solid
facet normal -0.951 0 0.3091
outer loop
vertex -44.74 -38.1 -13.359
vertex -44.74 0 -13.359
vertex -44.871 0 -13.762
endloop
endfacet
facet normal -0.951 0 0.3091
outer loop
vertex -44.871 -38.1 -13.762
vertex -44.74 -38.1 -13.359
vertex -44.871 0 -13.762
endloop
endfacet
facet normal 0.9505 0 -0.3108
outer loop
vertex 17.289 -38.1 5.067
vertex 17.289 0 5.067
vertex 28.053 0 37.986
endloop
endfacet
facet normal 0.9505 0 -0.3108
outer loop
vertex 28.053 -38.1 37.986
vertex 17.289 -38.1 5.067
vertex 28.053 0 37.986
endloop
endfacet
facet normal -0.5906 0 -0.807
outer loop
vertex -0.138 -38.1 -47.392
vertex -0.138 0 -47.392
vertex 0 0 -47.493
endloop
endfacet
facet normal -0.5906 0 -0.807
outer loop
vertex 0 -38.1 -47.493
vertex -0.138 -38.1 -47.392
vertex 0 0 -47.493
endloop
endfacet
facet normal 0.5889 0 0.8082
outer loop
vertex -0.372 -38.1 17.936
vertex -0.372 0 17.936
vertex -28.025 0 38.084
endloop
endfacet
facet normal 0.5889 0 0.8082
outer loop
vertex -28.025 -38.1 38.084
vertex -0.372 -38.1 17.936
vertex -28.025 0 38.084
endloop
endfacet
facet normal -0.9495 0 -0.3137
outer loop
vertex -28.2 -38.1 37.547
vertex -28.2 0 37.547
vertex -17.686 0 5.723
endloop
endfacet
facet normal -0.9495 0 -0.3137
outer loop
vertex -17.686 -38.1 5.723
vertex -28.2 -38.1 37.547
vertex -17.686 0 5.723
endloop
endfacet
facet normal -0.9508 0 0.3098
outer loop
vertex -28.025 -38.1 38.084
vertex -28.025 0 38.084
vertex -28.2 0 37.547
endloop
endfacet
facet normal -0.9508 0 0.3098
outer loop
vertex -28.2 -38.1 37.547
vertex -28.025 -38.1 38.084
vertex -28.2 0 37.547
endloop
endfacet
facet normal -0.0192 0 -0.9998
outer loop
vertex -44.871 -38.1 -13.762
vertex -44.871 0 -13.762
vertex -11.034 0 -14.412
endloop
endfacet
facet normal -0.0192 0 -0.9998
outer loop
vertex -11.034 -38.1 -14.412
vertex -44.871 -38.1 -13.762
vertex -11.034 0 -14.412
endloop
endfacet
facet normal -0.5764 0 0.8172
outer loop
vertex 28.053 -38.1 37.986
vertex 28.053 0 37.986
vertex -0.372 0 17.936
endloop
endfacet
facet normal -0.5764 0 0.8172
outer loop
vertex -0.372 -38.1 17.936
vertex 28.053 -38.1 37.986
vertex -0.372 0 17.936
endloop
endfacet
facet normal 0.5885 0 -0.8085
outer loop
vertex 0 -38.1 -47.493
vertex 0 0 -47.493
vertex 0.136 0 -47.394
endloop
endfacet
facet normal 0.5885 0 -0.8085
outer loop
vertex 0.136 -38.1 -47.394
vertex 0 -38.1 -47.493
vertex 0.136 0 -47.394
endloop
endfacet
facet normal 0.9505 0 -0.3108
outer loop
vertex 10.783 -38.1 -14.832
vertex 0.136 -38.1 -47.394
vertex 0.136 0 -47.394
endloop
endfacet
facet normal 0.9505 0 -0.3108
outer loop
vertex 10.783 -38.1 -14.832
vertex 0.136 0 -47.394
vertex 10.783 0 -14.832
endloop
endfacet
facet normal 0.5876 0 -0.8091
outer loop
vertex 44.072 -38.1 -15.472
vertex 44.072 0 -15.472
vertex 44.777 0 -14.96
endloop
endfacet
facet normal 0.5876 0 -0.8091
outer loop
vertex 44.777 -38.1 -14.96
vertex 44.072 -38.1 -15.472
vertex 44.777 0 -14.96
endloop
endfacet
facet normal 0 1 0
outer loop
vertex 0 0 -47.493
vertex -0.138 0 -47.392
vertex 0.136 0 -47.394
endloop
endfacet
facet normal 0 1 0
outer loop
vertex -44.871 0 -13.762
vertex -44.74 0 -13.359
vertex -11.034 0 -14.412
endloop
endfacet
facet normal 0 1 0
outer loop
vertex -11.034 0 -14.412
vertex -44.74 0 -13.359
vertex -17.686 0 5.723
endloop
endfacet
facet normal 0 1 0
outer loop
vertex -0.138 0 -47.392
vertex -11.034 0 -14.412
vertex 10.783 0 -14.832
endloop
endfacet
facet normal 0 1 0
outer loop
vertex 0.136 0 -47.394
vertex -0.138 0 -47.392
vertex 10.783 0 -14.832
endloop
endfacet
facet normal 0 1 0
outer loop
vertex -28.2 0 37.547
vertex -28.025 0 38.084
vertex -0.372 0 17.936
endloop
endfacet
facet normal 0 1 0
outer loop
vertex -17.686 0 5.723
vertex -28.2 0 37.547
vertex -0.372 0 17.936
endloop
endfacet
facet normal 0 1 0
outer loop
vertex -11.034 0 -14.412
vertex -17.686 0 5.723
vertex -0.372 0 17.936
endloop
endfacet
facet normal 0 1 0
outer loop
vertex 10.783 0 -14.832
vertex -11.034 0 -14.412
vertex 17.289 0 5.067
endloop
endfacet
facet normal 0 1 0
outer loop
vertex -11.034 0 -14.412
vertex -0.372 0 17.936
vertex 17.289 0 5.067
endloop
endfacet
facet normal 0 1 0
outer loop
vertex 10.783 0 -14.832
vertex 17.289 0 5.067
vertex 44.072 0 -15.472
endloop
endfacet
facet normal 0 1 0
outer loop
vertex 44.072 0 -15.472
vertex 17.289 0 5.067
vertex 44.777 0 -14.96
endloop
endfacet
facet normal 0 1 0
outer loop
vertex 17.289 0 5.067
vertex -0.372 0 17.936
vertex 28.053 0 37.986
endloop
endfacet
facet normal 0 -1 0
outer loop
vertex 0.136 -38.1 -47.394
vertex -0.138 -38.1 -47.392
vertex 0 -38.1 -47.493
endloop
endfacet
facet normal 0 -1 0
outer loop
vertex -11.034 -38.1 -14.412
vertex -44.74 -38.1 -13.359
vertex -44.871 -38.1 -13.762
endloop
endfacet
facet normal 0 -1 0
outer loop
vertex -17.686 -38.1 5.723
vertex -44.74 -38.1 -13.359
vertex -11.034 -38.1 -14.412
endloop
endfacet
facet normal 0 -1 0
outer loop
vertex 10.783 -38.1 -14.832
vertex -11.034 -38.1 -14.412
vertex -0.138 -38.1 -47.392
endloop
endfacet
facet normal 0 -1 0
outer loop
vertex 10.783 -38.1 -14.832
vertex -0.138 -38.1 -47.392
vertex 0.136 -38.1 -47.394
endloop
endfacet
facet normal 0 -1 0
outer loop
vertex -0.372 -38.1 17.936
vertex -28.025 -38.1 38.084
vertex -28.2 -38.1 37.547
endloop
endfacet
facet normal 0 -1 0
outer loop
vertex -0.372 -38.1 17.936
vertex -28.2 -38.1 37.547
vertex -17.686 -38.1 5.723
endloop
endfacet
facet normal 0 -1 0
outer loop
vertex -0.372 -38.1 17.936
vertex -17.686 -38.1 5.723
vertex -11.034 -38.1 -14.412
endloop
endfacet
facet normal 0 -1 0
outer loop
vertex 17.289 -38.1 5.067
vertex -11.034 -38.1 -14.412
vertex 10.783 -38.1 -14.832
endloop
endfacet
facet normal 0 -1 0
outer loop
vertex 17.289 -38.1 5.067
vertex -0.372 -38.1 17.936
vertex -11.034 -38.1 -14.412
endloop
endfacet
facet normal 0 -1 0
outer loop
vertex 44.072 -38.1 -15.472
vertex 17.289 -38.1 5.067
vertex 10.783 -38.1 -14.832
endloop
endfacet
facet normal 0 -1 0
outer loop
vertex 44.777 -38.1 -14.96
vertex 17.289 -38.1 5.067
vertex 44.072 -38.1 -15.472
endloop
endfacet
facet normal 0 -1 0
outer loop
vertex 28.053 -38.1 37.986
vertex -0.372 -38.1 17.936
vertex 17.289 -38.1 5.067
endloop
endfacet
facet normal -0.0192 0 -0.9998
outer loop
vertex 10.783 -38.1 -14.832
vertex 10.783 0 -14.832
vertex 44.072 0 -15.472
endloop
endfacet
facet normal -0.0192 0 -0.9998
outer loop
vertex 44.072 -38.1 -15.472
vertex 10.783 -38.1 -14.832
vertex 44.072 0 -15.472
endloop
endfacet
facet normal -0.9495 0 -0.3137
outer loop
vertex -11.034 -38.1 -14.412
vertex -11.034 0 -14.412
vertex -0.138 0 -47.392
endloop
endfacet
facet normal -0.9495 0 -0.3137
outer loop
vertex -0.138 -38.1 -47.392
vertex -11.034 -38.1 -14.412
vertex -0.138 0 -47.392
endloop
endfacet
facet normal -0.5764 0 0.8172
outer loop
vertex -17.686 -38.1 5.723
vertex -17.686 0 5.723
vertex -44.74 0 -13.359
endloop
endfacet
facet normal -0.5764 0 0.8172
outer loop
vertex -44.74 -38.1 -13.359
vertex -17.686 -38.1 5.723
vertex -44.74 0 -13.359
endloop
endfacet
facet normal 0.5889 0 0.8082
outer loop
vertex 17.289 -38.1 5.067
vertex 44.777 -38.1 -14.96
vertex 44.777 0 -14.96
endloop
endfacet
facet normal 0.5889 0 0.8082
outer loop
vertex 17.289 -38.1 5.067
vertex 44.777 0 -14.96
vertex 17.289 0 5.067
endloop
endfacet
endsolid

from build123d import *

# Parameters (mm, degrees)
F2_DEPTH = 38.1


with BuildPart() as f2:
    # F1 (on face) → F2 (new body)
    with BuildSketch(Plane.XZ):
        Polygon((0.1359417947, -47.3937628545), (10.7827526257, -14.8319200301), (-11.0337428161, -14.4123720925), (-0.1378061081, -47.3924083515), (0, -47.4925303496), align=None)
        Polygon((44.7767423867, -14.9603227402), (17.2892784216, 5.0674163686), (10.7827526257, -14.8319200301), (44.0723355844, -15.472104239), align=None)
        Polygon((-17.6862078163, 5.7234402568), (-0.3723328356, 17.935905908), (-28.025253062, 38.0841986931), (-28.1999326712, 37.5465901356), align=None)
        Polygon((-11.0337428161, -14.4123720925), (-17.6862078163, 5.7234402568), (-44.7402710109, -13.3593368718), (-44.8709923662, -13.7616558351), align=None)
        Polygon((17.2892784216, 5.0674163686), (28.0526187271, 37.9856489599), (-0.3723328356, 17.935905908), align=None)
        Polygon((10.7827526257, -14.8319200301), (17.2892784216, 5.0674163686), (-0.3723328356, 17.935905908), (-17.6862078163, 5.7234402568), (-11.0337428161, -14.4123720925), align=None)
    extrude(amount=F2_DEPTH)


solid = f2.part
